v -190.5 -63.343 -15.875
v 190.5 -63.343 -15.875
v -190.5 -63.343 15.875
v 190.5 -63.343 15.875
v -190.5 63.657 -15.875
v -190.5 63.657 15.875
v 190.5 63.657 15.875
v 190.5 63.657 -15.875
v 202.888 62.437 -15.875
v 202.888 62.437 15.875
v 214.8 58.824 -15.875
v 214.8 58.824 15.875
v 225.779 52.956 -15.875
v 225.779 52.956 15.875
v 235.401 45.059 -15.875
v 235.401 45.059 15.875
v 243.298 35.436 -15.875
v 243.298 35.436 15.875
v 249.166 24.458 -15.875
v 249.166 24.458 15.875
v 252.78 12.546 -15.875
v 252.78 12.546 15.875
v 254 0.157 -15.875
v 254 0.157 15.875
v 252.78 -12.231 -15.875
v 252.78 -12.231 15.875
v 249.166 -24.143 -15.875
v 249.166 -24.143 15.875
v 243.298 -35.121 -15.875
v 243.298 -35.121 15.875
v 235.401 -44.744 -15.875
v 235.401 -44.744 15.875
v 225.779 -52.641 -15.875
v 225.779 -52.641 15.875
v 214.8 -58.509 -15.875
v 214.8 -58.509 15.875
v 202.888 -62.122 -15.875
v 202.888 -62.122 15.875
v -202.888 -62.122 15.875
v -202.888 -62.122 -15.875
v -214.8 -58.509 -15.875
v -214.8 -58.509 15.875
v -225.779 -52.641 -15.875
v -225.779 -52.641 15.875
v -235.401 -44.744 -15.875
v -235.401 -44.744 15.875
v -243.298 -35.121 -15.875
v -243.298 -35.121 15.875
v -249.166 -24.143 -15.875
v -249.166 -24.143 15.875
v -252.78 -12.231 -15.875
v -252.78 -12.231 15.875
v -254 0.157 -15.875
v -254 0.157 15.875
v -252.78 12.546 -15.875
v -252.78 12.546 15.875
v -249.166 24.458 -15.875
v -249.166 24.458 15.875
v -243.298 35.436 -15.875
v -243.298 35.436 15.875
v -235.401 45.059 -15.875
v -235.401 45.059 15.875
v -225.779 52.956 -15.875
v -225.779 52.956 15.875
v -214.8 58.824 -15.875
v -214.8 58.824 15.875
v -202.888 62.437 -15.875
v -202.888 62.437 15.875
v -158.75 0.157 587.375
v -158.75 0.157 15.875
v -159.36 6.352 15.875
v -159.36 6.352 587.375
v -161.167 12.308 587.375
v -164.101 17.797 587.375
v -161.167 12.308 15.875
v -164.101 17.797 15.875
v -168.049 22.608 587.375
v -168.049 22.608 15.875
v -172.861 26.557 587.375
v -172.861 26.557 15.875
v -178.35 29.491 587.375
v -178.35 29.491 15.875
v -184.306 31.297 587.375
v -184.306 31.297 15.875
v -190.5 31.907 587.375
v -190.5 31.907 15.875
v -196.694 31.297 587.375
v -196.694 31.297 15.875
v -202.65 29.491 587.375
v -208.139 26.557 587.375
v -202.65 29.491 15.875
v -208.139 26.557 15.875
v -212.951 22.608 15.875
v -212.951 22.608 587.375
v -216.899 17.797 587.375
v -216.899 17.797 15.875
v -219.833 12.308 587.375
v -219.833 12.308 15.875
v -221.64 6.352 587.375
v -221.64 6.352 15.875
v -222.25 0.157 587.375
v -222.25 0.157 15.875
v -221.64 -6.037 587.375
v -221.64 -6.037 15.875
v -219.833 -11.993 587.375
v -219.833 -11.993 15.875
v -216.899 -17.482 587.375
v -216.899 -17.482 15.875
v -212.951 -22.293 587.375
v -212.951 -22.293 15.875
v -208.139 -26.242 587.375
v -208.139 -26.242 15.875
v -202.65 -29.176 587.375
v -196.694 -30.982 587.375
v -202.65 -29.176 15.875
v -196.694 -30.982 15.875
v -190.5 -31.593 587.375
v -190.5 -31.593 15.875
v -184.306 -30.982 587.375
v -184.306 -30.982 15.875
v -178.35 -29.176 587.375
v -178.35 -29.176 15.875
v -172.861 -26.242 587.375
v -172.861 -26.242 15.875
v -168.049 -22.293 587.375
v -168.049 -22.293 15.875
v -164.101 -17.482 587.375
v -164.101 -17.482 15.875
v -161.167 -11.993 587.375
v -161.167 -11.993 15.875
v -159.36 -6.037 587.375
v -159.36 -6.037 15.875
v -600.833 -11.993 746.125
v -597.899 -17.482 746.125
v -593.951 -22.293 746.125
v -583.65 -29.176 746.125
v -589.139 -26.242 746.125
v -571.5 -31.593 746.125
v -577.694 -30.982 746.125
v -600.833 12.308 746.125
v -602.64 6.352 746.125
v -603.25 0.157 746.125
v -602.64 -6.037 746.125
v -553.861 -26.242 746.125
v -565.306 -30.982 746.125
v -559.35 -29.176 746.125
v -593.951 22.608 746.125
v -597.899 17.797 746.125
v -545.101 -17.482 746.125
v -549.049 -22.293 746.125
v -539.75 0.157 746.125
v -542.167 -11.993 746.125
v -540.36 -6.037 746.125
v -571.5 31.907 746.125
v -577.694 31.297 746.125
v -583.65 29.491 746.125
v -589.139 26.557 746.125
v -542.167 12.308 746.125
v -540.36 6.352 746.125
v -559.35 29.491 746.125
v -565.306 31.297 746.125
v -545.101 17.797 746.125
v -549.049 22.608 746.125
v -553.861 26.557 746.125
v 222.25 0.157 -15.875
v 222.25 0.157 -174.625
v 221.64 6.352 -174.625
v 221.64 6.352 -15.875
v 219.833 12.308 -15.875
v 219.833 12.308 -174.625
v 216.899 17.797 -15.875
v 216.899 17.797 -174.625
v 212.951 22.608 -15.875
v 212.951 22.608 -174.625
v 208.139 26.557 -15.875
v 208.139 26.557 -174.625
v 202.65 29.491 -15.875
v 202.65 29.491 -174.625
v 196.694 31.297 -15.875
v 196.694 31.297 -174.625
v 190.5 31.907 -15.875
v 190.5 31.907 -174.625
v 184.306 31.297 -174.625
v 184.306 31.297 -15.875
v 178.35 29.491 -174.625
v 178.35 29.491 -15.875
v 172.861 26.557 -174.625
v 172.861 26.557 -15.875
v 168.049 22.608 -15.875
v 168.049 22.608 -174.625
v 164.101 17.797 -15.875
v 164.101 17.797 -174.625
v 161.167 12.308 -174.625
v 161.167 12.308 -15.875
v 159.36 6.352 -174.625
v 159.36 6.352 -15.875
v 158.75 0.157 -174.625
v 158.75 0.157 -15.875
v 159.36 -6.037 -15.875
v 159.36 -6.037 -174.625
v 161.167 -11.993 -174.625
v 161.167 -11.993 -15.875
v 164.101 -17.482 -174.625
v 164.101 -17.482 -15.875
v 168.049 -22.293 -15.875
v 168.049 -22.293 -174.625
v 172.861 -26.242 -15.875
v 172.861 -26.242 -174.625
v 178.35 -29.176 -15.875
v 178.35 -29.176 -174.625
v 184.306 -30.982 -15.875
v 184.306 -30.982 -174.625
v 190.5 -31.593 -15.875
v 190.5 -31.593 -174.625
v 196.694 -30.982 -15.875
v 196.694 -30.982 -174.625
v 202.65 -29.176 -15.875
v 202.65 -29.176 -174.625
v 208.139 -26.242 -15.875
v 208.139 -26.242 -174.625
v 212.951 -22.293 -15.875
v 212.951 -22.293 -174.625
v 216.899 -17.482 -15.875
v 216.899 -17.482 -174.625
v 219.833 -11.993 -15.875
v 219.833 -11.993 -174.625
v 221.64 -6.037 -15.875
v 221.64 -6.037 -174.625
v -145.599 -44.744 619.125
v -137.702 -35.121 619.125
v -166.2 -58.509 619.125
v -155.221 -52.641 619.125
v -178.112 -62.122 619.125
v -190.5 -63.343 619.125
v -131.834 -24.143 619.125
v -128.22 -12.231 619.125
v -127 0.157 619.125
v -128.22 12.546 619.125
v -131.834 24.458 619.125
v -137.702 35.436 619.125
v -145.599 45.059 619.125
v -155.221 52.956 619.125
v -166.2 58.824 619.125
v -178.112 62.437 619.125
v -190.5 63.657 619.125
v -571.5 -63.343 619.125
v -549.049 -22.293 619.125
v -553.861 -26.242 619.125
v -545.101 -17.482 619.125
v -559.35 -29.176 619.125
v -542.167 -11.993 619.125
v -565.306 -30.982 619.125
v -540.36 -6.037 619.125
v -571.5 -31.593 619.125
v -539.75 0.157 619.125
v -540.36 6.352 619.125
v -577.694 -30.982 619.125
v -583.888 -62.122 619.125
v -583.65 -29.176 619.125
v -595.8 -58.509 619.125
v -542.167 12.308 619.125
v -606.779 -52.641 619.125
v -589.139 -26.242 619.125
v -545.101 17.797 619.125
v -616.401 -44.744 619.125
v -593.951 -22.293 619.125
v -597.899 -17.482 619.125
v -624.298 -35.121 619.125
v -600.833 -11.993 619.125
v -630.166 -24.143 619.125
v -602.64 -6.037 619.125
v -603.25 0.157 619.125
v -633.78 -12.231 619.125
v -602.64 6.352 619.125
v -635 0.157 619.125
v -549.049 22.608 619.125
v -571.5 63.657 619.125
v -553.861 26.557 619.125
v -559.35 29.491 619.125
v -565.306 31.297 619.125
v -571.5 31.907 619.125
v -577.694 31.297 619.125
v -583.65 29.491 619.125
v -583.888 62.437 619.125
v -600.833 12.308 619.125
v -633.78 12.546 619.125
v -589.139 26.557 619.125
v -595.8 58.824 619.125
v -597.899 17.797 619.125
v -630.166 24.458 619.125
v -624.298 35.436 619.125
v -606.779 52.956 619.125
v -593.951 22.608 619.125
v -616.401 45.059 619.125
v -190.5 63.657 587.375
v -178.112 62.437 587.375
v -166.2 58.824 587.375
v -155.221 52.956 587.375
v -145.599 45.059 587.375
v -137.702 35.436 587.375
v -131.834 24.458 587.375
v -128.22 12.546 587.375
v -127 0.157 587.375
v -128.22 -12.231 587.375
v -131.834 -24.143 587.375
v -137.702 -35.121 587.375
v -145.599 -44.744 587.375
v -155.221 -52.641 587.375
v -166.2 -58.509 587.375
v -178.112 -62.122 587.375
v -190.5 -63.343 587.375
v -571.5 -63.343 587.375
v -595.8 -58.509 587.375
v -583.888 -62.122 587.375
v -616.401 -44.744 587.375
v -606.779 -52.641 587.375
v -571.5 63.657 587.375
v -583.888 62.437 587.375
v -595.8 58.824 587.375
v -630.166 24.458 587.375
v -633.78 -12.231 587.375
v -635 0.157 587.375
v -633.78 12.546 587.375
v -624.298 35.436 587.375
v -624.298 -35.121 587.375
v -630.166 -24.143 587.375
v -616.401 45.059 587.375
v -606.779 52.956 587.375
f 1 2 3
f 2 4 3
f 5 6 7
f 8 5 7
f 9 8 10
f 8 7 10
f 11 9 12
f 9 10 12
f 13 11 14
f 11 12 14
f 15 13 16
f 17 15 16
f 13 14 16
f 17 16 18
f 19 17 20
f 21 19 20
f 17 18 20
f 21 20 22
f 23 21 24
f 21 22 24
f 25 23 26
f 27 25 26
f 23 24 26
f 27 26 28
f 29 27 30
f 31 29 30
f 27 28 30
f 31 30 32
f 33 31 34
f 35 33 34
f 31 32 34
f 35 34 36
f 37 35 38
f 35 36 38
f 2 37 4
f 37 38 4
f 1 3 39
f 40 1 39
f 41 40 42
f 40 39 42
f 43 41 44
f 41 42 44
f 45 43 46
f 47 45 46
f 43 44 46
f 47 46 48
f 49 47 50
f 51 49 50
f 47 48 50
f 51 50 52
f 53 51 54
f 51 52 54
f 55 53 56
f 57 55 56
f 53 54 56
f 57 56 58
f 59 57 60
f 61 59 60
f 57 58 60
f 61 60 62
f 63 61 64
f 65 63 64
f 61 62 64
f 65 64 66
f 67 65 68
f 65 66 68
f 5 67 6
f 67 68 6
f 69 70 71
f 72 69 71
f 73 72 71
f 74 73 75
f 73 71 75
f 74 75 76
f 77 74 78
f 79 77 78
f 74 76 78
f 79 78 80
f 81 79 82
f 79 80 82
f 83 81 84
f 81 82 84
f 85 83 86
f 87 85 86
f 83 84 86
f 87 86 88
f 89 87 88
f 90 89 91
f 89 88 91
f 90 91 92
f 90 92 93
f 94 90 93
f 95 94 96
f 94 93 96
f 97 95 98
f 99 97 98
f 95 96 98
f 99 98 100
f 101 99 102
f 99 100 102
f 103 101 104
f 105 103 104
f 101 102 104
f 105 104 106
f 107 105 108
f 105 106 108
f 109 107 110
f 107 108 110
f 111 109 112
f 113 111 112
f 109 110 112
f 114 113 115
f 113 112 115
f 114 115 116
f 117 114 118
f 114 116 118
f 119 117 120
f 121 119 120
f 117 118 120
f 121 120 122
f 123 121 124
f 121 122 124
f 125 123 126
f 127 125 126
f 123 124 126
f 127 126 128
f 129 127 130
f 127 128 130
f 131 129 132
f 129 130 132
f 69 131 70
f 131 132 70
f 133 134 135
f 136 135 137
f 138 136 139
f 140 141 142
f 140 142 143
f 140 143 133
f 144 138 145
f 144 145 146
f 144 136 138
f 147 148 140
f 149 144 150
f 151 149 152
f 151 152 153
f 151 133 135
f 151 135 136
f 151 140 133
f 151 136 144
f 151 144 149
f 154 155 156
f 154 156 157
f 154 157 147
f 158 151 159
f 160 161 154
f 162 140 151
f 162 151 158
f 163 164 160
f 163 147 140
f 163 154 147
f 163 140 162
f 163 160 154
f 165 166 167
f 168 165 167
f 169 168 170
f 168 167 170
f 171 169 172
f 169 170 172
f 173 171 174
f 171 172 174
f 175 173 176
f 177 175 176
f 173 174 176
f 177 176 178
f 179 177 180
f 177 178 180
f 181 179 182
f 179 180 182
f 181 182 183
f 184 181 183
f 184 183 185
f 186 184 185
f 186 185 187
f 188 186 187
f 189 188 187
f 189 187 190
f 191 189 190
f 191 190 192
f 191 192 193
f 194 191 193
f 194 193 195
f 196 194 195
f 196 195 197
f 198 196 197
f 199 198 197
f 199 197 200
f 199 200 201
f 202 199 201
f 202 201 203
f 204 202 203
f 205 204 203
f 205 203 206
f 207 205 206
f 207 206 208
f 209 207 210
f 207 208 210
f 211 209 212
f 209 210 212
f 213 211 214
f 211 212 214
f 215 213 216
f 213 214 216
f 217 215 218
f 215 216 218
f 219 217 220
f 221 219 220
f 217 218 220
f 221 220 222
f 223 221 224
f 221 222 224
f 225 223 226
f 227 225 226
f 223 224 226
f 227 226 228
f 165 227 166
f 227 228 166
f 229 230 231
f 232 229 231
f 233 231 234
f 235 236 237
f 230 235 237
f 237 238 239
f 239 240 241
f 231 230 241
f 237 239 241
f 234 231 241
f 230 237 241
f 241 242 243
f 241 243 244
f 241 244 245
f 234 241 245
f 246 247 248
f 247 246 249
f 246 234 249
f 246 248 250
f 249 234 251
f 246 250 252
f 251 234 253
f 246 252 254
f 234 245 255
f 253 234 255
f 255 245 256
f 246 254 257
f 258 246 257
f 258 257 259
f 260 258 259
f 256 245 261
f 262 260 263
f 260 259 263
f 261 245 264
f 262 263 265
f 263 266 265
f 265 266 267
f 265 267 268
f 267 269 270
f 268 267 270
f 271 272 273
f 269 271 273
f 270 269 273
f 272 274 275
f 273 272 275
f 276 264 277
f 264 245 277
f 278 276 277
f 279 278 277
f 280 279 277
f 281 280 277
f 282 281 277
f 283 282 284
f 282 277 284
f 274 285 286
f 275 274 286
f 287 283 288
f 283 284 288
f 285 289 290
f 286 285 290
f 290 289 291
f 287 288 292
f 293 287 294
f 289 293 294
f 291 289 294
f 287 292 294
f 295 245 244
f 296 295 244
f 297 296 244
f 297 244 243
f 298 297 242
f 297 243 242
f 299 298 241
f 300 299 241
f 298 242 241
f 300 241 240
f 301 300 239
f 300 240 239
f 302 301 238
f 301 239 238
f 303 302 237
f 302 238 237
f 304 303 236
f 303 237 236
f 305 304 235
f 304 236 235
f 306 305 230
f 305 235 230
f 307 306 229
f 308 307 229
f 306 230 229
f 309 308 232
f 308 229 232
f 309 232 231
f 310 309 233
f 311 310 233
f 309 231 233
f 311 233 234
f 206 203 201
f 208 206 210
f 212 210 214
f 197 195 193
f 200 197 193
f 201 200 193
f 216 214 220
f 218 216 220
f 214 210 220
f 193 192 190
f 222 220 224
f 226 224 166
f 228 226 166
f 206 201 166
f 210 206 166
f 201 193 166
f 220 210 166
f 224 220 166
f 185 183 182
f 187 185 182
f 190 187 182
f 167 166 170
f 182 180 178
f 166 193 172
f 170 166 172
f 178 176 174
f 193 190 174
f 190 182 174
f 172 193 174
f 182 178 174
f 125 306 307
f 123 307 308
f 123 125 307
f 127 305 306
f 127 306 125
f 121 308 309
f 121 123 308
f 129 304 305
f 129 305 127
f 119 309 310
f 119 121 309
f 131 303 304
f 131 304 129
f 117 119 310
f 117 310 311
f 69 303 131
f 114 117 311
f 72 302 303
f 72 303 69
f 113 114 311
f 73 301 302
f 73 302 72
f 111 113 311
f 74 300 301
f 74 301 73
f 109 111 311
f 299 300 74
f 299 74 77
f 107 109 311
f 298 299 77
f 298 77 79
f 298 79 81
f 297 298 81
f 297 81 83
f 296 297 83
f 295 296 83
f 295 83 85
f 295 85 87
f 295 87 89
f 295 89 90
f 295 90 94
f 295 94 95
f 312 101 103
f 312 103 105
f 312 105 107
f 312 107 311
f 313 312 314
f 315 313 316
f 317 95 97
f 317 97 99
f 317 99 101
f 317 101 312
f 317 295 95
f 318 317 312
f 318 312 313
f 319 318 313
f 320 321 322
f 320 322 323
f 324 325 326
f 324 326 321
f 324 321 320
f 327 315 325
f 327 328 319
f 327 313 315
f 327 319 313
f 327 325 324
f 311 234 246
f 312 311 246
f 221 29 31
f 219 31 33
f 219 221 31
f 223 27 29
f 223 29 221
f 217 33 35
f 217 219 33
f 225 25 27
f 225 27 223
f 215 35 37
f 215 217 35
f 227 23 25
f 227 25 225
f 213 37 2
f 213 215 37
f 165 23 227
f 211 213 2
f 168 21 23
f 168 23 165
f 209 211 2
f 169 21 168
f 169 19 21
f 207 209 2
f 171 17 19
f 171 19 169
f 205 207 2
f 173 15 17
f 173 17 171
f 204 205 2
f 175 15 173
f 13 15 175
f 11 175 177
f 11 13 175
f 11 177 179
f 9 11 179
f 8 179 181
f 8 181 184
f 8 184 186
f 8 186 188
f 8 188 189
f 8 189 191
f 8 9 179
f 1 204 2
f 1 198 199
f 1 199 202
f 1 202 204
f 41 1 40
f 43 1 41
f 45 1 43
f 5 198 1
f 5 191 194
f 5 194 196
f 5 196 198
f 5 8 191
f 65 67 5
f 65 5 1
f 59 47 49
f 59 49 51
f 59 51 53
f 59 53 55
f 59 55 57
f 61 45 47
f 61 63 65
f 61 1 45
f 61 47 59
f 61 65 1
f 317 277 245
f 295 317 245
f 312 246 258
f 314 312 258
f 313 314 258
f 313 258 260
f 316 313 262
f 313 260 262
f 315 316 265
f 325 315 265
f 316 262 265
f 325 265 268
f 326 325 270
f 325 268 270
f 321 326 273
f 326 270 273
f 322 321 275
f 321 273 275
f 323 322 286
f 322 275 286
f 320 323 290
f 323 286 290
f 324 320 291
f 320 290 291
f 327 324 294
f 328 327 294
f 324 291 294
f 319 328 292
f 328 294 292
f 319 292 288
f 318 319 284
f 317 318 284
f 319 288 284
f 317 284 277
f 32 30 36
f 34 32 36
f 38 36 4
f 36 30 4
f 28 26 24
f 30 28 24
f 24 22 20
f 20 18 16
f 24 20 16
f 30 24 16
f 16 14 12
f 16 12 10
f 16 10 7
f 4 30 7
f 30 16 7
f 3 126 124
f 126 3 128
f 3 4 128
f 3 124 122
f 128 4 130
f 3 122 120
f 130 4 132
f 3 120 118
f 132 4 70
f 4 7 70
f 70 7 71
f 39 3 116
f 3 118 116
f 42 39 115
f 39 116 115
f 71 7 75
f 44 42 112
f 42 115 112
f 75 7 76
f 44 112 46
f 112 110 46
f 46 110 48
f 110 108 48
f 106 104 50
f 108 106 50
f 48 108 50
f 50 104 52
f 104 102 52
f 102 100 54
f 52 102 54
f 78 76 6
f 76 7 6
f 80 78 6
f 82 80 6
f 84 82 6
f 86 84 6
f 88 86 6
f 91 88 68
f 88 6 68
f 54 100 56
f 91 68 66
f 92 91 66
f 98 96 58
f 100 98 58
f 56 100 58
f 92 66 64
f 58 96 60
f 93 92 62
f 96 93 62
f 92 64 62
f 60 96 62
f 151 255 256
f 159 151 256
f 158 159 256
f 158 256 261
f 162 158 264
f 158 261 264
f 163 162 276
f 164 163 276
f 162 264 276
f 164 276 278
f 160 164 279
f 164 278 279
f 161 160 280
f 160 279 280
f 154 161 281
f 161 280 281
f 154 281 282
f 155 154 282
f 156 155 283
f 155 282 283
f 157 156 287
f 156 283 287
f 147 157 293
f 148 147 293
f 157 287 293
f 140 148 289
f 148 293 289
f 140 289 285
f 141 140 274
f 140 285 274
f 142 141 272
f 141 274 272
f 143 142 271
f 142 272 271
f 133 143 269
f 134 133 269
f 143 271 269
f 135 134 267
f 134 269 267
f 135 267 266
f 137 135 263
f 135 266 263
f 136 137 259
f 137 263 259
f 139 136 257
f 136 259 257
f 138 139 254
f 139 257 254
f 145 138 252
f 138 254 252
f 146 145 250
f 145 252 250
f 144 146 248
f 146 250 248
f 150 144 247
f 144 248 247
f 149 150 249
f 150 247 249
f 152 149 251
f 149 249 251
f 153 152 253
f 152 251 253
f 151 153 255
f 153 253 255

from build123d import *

# Parameters (mm, degrees)
SKETCH1_R           = 31.75
BOSS_EXTRUDE1_DEPTH = 15.875
SKETCH2_R           = 31.75
BOSS_EXTRUDE2_DEPTH = 571.5
BOSS_EXTRUDE3_START = -190.5
SKETCH4_R           = 31.75
BOSS_EXTRUDE3_DEPTH = 190.5
BOSS_EXTRUDE4_START = 31.75
BOSS_EXTRUDE4_DEPTH = 31.75
SKETCH7_R           = 31.75
BOSS_EXTRUDE5_DEPTH = 127


with BuildPart() as part:
    # Sketch1 → Boss-Extrude1 (new, symmetric)
    with BuildSketch(Plane.XY):
        with BuildLine():
            Line((-190.5, 63.657439452), (190.5, 63.657439452))
            ThreePointArc((190.5, 63.657439452), (254, 0.157439452), (190.5, -63.342560548))
            Line((190.5, -63.342560548), (-190.5, -63.342560548))
            ThreePointArc((-190.5, -63.342560548), (-254, 0.157439452), (-190.5, 63.657439452))
        make_face()
        with Locations((190.5, 0.157439452)):
            Circle(SKETCH1_R, mode=Mode.SUBTRACT)
    extrude(amount=BOSS_EXTRUDE1_DEPTH, both=True)

    # Sketch2 → Boss-Extrude2 (add)
    with BuildSketch(Plane.XY.offset(15.875)):
        with Locations((-190.5, 0.157439452)):
            Circle(SKETCH2_R)
    extrude(amount=BOSS_EXTRUDE2_DEPTH)

    # Sketch4 → Boss-Extrude3 (add)
    with BuildSketch(Plane.XY.offset(15.875).offset(BOSS_EXTRUDE3_START)):
        with Locations((190.5, 0.157439452)):
            Circle(SKETCH4_R)
    extrude(amount=BOSS_EXTRUDE3_DEPTH)

    # Sketch6 → Boss-Extrude4 (add)
    with BuildSketch(Plane.XY.offset(587.375).offset(BOSS_EXTRUDE4_START)):
        with BuildLine():
            Line((-571.5, 63.657439452), (-190.5, 63.657439452))
            ThreePointArc((-190.5, 63.657439452), (-127, 0.157439452), (-190.5, -63.342560548))
            Line((-190.5, -63.342560548), (-571.5, -63.342560548))
            ThreePointArc((-571.5, -63.342560548), (-635, 0.157439452), (-571.5, 63.657439452))
        make_face()
    extrude(amount=-BOSS_EXTRUDE4_DEPTH)

    # Sketch7 → Boss-Extrude5 (add)
    with BuildSketch(Plane.XY.offset(619.125)):
        with Locations((-571.5, 0.157439452)):
            Circle(SKETCH7_R)
    extrude(amount=BOSS_EXTRUDE5_DEPTH)


solid = part.part
